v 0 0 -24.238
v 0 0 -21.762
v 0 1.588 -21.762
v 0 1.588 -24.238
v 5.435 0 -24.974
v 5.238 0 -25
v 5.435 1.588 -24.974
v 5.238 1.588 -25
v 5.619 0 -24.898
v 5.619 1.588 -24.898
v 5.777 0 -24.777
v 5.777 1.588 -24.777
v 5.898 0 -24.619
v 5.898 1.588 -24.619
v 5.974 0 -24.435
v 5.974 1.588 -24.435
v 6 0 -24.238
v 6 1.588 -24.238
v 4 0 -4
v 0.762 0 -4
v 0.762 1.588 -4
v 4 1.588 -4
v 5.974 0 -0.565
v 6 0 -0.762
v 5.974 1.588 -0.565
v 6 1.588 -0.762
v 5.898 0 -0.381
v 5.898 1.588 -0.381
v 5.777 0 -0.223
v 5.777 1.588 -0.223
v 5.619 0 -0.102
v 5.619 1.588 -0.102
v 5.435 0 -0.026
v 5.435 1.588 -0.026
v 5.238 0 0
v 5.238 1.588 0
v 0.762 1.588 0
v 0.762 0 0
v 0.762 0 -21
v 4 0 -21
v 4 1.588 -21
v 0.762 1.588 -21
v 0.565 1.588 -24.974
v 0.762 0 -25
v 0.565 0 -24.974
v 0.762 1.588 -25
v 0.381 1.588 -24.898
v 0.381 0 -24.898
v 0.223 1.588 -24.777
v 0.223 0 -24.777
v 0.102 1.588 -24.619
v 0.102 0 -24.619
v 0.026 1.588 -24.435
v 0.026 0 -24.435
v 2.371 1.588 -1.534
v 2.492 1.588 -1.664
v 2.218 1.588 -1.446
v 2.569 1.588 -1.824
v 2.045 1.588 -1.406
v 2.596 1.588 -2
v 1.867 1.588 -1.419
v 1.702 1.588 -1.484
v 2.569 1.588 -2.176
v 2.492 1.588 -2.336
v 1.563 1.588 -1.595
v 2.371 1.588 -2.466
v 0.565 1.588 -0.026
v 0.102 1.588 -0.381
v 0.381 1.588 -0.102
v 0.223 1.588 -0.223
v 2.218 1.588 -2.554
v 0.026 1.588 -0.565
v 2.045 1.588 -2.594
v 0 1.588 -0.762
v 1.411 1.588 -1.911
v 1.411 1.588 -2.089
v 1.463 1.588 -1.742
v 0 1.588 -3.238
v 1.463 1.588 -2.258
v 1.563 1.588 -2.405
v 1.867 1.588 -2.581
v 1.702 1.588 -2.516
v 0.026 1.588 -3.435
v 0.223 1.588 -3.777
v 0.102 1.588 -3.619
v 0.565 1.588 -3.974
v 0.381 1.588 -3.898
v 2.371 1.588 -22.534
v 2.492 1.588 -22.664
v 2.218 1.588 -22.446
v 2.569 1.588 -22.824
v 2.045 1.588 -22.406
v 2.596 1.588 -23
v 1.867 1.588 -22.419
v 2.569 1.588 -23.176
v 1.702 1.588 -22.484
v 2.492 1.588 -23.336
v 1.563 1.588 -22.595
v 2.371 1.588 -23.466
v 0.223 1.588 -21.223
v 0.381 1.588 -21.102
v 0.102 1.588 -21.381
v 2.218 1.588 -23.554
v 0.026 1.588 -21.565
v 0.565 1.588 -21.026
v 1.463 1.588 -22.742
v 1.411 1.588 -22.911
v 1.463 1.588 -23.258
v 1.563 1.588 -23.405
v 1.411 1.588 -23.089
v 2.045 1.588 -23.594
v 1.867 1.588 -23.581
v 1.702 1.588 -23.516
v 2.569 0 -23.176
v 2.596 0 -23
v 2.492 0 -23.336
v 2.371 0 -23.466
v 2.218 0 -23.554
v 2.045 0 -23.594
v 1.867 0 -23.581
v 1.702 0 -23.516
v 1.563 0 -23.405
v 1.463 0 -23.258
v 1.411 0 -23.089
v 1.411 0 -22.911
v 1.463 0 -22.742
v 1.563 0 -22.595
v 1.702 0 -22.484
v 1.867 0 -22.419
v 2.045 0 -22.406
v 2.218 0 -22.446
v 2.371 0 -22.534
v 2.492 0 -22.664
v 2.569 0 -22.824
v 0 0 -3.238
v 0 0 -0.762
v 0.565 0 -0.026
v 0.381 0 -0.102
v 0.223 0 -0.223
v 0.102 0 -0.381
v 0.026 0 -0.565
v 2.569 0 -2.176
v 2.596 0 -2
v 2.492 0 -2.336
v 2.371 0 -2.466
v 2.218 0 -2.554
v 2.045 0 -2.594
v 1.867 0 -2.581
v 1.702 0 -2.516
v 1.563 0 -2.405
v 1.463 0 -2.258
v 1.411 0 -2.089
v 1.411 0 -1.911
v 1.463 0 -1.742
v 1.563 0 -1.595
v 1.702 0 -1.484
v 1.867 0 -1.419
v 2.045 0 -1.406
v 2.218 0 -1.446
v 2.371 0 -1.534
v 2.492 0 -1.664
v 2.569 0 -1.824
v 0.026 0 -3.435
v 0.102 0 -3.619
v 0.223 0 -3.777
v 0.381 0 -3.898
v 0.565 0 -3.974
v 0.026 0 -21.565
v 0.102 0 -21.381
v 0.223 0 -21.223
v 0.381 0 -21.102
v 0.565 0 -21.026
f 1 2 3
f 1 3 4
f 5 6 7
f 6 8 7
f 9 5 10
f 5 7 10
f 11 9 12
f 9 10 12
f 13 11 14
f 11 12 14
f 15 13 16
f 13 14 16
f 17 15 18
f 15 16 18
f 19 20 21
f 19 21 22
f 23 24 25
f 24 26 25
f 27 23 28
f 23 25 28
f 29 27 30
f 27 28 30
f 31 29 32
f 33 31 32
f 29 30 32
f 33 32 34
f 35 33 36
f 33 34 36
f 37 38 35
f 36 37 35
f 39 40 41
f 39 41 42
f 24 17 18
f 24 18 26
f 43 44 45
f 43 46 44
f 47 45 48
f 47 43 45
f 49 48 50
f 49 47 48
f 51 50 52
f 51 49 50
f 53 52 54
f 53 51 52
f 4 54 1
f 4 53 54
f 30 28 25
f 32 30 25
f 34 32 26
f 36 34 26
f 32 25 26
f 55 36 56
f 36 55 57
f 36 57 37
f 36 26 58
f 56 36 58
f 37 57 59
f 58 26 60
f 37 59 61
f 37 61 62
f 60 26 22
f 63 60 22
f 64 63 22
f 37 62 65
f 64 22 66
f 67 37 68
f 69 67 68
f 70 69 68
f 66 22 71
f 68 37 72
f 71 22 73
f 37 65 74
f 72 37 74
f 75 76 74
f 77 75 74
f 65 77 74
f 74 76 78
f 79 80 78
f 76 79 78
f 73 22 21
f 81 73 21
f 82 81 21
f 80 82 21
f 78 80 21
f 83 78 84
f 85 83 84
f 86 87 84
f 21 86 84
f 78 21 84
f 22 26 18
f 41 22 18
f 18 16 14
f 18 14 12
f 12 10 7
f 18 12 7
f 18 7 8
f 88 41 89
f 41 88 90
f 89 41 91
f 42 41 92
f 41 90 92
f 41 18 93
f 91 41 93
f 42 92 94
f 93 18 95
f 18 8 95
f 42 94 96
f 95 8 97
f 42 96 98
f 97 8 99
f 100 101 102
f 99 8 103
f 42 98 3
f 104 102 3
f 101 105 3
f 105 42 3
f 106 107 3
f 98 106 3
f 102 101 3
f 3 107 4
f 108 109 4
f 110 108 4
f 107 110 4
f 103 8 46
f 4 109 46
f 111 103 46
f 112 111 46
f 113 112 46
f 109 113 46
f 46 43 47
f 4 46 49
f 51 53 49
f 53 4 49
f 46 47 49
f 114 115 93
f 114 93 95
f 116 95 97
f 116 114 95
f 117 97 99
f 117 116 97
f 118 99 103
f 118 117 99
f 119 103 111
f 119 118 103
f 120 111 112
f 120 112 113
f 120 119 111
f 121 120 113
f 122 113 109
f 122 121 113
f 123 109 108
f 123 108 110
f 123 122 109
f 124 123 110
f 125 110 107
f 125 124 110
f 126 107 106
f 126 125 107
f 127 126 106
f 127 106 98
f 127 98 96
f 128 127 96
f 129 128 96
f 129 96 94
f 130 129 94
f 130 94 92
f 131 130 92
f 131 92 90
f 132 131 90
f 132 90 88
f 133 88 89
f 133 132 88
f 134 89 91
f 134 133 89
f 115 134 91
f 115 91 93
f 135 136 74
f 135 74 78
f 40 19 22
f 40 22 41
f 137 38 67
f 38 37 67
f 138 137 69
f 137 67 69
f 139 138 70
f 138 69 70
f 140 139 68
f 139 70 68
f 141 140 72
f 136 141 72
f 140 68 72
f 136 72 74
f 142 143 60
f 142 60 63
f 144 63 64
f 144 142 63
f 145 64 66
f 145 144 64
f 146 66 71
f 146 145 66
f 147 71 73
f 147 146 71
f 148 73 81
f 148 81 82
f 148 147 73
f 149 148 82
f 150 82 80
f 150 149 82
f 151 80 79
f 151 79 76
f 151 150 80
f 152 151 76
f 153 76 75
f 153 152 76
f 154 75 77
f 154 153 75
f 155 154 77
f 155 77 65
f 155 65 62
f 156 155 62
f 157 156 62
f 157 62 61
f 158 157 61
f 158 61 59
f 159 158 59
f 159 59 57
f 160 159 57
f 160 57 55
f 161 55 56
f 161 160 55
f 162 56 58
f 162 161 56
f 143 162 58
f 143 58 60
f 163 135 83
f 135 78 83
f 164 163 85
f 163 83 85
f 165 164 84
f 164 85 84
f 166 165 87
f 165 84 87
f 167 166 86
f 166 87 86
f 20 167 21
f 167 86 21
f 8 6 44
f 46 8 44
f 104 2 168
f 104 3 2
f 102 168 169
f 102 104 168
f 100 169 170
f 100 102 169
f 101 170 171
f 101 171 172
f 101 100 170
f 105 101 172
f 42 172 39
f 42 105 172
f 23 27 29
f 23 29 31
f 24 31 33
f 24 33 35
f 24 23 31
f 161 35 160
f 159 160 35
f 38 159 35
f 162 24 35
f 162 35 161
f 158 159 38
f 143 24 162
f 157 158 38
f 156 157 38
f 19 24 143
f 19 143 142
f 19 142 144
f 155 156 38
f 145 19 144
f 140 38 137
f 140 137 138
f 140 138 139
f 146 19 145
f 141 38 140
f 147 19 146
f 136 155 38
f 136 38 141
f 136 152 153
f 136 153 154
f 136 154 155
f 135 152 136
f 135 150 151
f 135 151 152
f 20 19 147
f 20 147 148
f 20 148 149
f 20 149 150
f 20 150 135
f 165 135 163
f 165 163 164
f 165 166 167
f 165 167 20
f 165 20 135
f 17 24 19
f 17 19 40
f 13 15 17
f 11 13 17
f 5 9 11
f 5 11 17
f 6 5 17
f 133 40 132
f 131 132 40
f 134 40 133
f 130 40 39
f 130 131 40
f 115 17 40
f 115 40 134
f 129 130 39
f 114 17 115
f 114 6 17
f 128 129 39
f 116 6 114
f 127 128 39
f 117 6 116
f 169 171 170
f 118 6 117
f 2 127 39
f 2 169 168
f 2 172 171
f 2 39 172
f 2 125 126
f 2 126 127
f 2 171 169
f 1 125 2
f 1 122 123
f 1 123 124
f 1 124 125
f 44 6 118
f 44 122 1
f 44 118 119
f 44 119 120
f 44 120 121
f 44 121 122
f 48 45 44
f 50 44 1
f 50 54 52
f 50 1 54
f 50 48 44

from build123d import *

# Parameters (mm, degrees)
SKETCH1_R           = 0.59563
BOSS_EXTRUDE1_DEPTH = 1.5875
FILLET1_R           = 0.762


with BuildPart() as part:
    # Sketch1 → Boss-Extrude1 (new body)
    with BuildSketch(Plane(origin=(0, 0, 0), x_dir=(1, 0, 0), z_dir=(0, 1, 0))):
        Polygon((0, 25), (4, 25), (6, 25), (6, 0), (4, 0), (0, 0), (0, 4), (4, 4), (4, 21), (0, 21), align=None)
        with Locations((2, 23)):
            Circle(SKETCH1_R, mode=Mode.SUBTRACT)
        with Locations((2, 2)):
            Circle(SKETCH1_R, mode=Mode.SUBTRACT)
    extrude(amount=BOSS_EXTRUDE1_DEPTH)

    # Fillet1
    fillet1_edges = [part.edges().sort_by_distance(p)[0] for p in [
        (6, 0.79375, -25),
        (6, 0.79375, 0),
        (0, 0.79375, 0),
        (0, 0.79375, -4),
        (0, 0.79375, -21),
        (0, 0.79375, -25),
    ]]
    fillet(fillet1_edges, radius=FILLET1_R)


solid = part.part
